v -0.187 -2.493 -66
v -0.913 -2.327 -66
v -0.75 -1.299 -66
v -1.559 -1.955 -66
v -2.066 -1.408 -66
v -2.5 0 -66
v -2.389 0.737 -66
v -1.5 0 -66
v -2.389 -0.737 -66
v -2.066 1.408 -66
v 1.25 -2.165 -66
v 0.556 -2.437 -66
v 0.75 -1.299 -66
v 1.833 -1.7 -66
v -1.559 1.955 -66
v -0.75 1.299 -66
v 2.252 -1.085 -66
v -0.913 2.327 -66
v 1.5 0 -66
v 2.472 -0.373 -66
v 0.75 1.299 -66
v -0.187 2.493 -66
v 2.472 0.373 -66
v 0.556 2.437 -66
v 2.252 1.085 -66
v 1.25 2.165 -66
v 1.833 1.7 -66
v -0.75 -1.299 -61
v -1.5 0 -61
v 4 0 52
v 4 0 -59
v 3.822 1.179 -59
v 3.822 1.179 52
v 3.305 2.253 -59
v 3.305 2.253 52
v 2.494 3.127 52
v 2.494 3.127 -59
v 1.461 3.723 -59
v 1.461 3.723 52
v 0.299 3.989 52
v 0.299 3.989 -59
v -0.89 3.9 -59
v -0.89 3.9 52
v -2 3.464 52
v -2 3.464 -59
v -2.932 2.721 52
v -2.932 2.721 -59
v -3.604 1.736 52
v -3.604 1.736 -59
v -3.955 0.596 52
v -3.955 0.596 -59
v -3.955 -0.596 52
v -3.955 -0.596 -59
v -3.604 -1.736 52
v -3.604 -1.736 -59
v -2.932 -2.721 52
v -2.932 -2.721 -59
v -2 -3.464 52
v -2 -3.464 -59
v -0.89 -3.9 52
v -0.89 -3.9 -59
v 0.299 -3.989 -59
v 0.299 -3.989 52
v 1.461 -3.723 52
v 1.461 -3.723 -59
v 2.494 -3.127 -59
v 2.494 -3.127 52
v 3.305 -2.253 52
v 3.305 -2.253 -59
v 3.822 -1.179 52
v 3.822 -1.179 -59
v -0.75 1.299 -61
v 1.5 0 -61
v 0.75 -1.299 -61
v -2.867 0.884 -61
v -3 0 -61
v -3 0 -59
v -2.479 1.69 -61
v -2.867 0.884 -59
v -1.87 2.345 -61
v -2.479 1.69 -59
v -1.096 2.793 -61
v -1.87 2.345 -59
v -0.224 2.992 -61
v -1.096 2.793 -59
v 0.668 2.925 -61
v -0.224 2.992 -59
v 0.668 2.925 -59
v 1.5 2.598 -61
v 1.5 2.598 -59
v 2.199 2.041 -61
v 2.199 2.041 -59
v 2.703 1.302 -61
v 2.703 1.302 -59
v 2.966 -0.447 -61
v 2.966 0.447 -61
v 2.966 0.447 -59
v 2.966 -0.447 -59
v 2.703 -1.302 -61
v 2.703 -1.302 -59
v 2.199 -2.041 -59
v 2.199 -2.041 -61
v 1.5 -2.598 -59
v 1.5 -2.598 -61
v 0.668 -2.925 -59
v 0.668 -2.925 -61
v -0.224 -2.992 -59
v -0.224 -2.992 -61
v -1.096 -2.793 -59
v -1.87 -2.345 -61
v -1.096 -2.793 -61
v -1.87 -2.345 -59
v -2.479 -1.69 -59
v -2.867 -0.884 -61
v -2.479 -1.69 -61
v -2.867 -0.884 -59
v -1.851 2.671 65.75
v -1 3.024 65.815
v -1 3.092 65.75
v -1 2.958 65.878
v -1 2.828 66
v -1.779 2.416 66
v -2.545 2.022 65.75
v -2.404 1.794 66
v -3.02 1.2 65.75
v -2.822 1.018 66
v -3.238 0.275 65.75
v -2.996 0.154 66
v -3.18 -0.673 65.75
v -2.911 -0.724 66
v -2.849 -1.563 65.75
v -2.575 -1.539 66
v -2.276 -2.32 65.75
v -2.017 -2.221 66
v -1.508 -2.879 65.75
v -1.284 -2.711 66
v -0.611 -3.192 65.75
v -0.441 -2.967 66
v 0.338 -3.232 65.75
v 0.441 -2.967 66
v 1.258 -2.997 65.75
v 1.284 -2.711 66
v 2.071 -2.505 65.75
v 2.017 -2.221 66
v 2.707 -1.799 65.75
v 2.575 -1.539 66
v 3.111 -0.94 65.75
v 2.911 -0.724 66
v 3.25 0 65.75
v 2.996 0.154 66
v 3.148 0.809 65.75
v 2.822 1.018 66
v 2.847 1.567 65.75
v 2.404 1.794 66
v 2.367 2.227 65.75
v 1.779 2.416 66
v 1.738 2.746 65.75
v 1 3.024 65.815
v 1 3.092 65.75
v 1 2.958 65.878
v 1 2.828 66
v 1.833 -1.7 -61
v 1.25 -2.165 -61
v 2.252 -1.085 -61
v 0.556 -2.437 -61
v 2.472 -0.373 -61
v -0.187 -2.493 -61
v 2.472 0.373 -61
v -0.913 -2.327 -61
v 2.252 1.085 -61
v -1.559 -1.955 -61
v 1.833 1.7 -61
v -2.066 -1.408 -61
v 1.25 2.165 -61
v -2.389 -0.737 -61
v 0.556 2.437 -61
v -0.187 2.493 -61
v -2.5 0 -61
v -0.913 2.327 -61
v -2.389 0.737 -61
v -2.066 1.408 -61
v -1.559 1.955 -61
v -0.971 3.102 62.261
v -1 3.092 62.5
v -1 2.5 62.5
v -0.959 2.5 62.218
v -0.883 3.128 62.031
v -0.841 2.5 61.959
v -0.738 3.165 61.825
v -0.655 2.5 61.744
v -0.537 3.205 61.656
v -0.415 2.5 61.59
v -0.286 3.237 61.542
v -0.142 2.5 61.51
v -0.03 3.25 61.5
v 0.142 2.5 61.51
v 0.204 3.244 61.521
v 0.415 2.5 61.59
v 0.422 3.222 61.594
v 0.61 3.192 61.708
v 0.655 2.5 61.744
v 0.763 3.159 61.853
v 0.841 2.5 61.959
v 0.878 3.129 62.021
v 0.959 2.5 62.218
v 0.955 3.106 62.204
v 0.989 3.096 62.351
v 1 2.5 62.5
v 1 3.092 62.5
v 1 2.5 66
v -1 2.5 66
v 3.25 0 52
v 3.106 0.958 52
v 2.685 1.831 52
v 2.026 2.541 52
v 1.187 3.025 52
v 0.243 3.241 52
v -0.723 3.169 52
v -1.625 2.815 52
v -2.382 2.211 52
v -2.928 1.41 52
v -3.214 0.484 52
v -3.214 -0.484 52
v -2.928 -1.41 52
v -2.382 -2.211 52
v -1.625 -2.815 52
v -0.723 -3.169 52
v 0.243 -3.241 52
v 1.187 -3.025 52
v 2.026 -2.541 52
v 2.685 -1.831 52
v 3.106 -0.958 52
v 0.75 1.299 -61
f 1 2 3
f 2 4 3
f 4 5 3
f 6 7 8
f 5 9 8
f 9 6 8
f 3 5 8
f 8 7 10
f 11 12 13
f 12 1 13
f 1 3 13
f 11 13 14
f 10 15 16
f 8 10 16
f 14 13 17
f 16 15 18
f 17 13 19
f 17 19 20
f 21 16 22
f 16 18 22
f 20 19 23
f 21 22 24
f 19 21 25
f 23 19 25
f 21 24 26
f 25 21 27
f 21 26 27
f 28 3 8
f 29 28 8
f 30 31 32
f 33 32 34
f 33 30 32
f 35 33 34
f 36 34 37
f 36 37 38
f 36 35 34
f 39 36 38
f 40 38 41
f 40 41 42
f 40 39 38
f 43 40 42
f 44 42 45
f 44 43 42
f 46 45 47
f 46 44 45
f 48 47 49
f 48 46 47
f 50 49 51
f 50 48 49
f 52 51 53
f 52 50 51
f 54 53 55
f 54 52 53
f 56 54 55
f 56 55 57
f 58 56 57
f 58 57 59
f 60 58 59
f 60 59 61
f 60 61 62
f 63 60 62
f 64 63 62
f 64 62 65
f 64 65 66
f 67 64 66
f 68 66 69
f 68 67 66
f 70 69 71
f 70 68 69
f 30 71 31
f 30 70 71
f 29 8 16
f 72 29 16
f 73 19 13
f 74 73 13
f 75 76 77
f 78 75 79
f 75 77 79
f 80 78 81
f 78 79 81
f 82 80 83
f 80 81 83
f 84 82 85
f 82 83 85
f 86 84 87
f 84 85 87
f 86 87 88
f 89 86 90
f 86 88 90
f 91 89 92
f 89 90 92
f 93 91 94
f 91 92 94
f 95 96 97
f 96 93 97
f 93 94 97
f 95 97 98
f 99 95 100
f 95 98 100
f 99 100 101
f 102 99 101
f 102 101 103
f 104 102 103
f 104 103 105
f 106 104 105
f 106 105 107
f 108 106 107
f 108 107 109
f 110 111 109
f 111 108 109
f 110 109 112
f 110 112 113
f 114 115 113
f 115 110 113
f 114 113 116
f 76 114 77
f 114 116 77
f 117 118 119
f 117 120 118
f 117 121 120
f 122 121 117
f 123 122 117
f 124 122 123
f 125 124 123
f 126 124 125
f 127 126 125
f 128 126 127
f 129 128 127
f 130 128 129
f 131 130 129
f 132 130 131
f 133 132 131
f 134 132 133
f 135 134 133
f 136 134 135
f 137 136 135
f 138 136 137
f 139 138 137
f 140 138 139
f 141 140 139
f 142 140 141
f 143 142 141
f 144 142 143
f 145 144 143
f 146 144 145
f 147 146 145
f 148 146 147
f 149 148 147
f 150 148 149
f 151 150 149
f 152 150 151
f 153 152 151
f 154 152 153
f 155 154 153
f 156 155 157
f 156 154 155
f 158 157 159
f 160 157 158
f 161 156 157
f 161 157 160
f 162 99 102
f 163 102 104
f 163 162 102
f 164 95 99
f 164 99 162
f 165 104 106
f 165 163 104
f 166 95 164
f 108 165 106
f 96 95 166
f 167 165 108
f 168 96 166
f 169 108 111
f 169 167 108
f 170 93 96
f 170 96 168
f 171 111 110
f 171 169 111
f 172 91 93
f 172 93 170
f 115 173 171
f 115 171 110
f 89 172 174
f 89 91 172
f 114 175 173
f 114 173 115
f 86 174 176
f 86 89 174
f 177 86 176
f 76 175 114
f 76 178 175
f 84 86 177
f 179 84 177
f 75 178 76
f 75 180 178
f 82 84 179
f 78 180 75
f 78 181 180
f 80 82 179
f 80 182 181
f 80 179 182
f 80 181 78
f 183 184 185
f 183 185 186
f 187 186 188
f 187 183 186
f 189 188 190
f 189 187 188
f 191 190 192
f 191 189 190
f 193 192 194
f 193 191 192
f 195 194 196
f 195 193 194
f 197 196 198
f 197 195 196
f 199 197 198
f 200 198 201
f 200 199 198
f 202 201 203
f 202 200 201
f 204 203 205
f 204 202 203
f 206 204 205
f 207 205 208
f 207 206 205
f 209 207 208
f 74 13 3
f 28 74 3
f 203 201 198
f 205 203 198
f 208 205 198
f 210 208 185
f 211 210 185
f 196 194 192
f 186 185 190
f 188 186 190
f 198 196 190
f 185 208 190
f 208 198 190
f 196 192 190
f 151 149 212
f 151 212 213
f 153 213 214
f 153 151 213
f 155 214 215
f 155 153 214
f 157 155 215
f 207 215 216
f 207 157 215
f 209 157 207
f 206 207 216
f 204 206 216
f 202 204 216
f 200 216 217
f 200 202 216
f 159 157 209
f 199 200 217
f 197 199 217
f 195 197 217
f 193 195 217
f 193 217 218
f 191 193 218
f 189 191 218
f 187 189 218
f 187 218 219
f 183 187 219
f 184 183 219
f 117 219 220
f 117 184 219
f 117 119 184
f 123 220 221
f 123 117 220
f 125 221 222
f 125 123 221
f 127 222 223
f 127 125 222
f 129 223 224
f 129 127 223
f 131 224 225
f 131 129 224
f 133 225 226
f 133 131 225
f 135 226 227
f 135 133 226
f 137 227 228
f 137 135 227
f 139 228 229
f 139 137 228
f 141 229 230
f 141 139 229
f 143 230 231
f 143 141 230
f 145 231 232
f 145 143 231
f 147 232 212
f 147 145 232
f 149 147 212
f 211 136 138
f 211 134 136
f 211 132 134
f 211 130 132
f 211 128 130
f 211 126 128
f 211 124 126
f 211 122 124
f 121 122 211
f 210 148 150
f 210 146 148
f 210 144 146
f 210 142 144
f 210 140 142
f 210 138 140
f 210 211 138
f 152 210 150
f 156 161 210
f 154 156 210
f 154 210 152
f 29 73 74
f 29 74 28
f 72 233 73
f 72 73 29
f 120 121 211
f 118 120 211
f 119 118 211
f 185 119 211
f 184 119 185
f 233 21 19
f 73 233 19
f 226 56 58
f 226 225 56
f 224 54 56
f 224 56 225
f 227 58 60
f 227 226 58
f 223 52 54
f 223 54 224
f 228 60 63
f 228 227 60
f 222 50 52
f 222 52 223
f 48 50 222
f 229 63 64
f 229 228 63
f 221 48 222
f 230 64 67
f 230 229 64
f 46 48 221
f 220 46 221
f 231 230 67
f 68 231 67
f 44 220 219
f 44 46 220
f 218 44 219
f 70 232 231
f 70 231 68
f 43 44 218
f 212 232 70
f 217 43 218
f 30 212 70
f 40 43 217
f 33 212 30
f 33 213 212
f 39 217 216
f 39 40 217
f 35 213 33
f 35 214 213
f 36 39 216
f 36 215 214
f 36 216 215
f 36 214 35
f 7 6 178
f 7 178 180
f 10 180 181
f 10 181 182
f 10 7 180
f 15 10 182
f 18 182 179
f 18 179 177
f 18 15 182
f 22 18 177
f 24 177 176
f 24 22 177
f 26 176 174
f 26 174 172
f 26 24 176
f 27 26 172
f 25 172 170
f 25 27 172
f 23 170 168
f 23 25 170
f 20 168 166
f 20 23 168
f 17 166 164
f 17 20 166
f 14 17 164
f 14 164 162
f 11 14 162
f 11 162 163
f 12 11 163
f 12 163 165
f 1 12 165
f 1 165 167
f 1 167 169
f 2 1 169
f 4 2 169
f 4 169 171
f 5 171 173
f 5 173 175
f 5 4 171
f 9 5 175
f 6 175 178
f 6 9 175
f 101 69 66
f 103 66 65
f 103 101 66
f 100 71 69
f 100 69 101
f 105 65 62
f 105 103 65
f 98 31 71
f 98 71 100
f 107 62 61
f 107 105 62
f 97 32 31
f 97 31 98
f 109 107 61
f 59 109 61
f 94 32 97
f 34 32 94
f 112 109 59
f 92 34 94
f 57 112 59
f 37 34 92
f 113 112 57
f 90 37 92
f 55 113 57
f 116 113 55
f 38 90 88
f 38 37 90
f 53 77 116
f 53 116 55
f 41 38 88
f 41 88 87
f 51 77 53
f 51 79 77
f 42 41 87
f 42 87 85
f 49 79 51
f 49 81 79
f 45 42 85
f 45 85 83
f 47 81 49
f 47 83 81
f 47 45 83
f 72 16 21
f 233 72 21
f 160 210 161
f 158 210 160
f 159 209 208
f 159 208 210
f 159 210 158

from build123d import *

# Parameters (mm, degrees)
SKETCH1_R           = 4
BOSS_EXTRUDE1_DEPTH = 66
SKETCH2_R           = 4
SKETCH2_R_2         = 3.25
CUT_EXTRUDE1_DEPTH  = 14
CUT_EXTRUDE2_DEPTH  = 1
CHAMFER1_SIZE       = 0.25
CUT_EXTRUDE3_START  = -7
SKETCH5_R           = 4
SKETCH5_R_2         = 3
CUT_EXTRUDE3_DEPTH  = 7
SKETCH7_R           = 3.566008396
SKETCH7_R_2         = 2.5
CUT_EXTRUDE4_DEPTH  = 5
CUT_EXTRUDE5_DEPTH  = 5


with BuildPart() as part:
    # Sketch1 → Boss-Extrude1 (new, symmetric)
    with BuildSketch(Plane.XY):
        Circle(SKETCH1_R)
    extrude(amount=BOSS_EXTRUDE1_DEPTH, both=True)

    # Sketch2 → Cut-Extrude1 (cut)
    with BuildSketch(Plane.XY.offset(66)):
        Circle(SKETCH2_R)
        Circle(SKETCH2_R_2, mode=Mode.SUBTRACT)
    extrude(amount=-CUT_EXTRUDE1_DEPTH, mode=Mode.SUBTRACT)

    # Sketch3 → Cut-Extrude2 (cut)
    with BuildSketch(Plane(origin=(0, 3.5, 0), x_dir=(1, 0, 0), z_dir=(0, 1, 0))):
        with BuildLine():
            Line((1, -62.5), (1, -66))
            ThreePointArc((1, -66), (0, -67), (-1, -66))
            Line((-1, -66), (-1, -62.5))
            ThreePointArc((-1, -62.5), (0, -61.5), (1, -62.5))
        make_face()
    extrude(amount=-CUT_EXTRUDE2_DEPTH, mode=Mode.SUBTRACT)

    # Chamfer1
    chamfer1_edges = [part.edges().sort_by_distance(p)[0] for p in [
        (-1.912132318, -2.627974505, 66),
    ]]
    chamfer(chamfer1_edges, length=CHAMFER1_SIZE)

    # Sketch5 → Cut-Extrude3 (cut)
    with BuildSketch(Plane(origin=(0, 0, -66), x_dir=(-1, 0, 0), z_dir=(0, 0, -1)).offset(CUT_EXTRUDE3_START)):
        Circle(SKETCH5_R)
        Circle(SKETCH5_R_2, mode=Mode.SUBTRACT)
    extrude(amount=CUT_EXTRUDE3_DEPTH, mode=Mode.SUBTRACT)

    # Sketch7 → Cut-Extrude4 (cut)
    with BuildSketch(Plane(origin=(0, 0, -66), x_dir=(-1, 0, 0), z_dir=(0, 0, -1))):
        Circle(SKETCH7_R)
        Circle(SKETCH7_R_2, mode=Mode.SUBTRACT)
    extrude(amount=-CUT_EXTRUDE4_DEPTH, mode=Mode.SUBTRACT)

    # Sketch8 → Cut-Extrude5 (cut)
    with BuildSketch(Plane(origin=(0, 0, -66), x_dir=(-1, 0, 0), z_dir=(0, 0, -1))):
        Polygon((0.75, -1.299038106), (1.5, 0), (0.75, 1.299038106), (-0.75, 1.299038106), (-1.5, 0), (-0.75, -1.299038106), align=None)
    extrude(amount=-CUT_EXTRUDE5_DEPTH, mode=Mode.SUBTRACT)


solid = part.part
